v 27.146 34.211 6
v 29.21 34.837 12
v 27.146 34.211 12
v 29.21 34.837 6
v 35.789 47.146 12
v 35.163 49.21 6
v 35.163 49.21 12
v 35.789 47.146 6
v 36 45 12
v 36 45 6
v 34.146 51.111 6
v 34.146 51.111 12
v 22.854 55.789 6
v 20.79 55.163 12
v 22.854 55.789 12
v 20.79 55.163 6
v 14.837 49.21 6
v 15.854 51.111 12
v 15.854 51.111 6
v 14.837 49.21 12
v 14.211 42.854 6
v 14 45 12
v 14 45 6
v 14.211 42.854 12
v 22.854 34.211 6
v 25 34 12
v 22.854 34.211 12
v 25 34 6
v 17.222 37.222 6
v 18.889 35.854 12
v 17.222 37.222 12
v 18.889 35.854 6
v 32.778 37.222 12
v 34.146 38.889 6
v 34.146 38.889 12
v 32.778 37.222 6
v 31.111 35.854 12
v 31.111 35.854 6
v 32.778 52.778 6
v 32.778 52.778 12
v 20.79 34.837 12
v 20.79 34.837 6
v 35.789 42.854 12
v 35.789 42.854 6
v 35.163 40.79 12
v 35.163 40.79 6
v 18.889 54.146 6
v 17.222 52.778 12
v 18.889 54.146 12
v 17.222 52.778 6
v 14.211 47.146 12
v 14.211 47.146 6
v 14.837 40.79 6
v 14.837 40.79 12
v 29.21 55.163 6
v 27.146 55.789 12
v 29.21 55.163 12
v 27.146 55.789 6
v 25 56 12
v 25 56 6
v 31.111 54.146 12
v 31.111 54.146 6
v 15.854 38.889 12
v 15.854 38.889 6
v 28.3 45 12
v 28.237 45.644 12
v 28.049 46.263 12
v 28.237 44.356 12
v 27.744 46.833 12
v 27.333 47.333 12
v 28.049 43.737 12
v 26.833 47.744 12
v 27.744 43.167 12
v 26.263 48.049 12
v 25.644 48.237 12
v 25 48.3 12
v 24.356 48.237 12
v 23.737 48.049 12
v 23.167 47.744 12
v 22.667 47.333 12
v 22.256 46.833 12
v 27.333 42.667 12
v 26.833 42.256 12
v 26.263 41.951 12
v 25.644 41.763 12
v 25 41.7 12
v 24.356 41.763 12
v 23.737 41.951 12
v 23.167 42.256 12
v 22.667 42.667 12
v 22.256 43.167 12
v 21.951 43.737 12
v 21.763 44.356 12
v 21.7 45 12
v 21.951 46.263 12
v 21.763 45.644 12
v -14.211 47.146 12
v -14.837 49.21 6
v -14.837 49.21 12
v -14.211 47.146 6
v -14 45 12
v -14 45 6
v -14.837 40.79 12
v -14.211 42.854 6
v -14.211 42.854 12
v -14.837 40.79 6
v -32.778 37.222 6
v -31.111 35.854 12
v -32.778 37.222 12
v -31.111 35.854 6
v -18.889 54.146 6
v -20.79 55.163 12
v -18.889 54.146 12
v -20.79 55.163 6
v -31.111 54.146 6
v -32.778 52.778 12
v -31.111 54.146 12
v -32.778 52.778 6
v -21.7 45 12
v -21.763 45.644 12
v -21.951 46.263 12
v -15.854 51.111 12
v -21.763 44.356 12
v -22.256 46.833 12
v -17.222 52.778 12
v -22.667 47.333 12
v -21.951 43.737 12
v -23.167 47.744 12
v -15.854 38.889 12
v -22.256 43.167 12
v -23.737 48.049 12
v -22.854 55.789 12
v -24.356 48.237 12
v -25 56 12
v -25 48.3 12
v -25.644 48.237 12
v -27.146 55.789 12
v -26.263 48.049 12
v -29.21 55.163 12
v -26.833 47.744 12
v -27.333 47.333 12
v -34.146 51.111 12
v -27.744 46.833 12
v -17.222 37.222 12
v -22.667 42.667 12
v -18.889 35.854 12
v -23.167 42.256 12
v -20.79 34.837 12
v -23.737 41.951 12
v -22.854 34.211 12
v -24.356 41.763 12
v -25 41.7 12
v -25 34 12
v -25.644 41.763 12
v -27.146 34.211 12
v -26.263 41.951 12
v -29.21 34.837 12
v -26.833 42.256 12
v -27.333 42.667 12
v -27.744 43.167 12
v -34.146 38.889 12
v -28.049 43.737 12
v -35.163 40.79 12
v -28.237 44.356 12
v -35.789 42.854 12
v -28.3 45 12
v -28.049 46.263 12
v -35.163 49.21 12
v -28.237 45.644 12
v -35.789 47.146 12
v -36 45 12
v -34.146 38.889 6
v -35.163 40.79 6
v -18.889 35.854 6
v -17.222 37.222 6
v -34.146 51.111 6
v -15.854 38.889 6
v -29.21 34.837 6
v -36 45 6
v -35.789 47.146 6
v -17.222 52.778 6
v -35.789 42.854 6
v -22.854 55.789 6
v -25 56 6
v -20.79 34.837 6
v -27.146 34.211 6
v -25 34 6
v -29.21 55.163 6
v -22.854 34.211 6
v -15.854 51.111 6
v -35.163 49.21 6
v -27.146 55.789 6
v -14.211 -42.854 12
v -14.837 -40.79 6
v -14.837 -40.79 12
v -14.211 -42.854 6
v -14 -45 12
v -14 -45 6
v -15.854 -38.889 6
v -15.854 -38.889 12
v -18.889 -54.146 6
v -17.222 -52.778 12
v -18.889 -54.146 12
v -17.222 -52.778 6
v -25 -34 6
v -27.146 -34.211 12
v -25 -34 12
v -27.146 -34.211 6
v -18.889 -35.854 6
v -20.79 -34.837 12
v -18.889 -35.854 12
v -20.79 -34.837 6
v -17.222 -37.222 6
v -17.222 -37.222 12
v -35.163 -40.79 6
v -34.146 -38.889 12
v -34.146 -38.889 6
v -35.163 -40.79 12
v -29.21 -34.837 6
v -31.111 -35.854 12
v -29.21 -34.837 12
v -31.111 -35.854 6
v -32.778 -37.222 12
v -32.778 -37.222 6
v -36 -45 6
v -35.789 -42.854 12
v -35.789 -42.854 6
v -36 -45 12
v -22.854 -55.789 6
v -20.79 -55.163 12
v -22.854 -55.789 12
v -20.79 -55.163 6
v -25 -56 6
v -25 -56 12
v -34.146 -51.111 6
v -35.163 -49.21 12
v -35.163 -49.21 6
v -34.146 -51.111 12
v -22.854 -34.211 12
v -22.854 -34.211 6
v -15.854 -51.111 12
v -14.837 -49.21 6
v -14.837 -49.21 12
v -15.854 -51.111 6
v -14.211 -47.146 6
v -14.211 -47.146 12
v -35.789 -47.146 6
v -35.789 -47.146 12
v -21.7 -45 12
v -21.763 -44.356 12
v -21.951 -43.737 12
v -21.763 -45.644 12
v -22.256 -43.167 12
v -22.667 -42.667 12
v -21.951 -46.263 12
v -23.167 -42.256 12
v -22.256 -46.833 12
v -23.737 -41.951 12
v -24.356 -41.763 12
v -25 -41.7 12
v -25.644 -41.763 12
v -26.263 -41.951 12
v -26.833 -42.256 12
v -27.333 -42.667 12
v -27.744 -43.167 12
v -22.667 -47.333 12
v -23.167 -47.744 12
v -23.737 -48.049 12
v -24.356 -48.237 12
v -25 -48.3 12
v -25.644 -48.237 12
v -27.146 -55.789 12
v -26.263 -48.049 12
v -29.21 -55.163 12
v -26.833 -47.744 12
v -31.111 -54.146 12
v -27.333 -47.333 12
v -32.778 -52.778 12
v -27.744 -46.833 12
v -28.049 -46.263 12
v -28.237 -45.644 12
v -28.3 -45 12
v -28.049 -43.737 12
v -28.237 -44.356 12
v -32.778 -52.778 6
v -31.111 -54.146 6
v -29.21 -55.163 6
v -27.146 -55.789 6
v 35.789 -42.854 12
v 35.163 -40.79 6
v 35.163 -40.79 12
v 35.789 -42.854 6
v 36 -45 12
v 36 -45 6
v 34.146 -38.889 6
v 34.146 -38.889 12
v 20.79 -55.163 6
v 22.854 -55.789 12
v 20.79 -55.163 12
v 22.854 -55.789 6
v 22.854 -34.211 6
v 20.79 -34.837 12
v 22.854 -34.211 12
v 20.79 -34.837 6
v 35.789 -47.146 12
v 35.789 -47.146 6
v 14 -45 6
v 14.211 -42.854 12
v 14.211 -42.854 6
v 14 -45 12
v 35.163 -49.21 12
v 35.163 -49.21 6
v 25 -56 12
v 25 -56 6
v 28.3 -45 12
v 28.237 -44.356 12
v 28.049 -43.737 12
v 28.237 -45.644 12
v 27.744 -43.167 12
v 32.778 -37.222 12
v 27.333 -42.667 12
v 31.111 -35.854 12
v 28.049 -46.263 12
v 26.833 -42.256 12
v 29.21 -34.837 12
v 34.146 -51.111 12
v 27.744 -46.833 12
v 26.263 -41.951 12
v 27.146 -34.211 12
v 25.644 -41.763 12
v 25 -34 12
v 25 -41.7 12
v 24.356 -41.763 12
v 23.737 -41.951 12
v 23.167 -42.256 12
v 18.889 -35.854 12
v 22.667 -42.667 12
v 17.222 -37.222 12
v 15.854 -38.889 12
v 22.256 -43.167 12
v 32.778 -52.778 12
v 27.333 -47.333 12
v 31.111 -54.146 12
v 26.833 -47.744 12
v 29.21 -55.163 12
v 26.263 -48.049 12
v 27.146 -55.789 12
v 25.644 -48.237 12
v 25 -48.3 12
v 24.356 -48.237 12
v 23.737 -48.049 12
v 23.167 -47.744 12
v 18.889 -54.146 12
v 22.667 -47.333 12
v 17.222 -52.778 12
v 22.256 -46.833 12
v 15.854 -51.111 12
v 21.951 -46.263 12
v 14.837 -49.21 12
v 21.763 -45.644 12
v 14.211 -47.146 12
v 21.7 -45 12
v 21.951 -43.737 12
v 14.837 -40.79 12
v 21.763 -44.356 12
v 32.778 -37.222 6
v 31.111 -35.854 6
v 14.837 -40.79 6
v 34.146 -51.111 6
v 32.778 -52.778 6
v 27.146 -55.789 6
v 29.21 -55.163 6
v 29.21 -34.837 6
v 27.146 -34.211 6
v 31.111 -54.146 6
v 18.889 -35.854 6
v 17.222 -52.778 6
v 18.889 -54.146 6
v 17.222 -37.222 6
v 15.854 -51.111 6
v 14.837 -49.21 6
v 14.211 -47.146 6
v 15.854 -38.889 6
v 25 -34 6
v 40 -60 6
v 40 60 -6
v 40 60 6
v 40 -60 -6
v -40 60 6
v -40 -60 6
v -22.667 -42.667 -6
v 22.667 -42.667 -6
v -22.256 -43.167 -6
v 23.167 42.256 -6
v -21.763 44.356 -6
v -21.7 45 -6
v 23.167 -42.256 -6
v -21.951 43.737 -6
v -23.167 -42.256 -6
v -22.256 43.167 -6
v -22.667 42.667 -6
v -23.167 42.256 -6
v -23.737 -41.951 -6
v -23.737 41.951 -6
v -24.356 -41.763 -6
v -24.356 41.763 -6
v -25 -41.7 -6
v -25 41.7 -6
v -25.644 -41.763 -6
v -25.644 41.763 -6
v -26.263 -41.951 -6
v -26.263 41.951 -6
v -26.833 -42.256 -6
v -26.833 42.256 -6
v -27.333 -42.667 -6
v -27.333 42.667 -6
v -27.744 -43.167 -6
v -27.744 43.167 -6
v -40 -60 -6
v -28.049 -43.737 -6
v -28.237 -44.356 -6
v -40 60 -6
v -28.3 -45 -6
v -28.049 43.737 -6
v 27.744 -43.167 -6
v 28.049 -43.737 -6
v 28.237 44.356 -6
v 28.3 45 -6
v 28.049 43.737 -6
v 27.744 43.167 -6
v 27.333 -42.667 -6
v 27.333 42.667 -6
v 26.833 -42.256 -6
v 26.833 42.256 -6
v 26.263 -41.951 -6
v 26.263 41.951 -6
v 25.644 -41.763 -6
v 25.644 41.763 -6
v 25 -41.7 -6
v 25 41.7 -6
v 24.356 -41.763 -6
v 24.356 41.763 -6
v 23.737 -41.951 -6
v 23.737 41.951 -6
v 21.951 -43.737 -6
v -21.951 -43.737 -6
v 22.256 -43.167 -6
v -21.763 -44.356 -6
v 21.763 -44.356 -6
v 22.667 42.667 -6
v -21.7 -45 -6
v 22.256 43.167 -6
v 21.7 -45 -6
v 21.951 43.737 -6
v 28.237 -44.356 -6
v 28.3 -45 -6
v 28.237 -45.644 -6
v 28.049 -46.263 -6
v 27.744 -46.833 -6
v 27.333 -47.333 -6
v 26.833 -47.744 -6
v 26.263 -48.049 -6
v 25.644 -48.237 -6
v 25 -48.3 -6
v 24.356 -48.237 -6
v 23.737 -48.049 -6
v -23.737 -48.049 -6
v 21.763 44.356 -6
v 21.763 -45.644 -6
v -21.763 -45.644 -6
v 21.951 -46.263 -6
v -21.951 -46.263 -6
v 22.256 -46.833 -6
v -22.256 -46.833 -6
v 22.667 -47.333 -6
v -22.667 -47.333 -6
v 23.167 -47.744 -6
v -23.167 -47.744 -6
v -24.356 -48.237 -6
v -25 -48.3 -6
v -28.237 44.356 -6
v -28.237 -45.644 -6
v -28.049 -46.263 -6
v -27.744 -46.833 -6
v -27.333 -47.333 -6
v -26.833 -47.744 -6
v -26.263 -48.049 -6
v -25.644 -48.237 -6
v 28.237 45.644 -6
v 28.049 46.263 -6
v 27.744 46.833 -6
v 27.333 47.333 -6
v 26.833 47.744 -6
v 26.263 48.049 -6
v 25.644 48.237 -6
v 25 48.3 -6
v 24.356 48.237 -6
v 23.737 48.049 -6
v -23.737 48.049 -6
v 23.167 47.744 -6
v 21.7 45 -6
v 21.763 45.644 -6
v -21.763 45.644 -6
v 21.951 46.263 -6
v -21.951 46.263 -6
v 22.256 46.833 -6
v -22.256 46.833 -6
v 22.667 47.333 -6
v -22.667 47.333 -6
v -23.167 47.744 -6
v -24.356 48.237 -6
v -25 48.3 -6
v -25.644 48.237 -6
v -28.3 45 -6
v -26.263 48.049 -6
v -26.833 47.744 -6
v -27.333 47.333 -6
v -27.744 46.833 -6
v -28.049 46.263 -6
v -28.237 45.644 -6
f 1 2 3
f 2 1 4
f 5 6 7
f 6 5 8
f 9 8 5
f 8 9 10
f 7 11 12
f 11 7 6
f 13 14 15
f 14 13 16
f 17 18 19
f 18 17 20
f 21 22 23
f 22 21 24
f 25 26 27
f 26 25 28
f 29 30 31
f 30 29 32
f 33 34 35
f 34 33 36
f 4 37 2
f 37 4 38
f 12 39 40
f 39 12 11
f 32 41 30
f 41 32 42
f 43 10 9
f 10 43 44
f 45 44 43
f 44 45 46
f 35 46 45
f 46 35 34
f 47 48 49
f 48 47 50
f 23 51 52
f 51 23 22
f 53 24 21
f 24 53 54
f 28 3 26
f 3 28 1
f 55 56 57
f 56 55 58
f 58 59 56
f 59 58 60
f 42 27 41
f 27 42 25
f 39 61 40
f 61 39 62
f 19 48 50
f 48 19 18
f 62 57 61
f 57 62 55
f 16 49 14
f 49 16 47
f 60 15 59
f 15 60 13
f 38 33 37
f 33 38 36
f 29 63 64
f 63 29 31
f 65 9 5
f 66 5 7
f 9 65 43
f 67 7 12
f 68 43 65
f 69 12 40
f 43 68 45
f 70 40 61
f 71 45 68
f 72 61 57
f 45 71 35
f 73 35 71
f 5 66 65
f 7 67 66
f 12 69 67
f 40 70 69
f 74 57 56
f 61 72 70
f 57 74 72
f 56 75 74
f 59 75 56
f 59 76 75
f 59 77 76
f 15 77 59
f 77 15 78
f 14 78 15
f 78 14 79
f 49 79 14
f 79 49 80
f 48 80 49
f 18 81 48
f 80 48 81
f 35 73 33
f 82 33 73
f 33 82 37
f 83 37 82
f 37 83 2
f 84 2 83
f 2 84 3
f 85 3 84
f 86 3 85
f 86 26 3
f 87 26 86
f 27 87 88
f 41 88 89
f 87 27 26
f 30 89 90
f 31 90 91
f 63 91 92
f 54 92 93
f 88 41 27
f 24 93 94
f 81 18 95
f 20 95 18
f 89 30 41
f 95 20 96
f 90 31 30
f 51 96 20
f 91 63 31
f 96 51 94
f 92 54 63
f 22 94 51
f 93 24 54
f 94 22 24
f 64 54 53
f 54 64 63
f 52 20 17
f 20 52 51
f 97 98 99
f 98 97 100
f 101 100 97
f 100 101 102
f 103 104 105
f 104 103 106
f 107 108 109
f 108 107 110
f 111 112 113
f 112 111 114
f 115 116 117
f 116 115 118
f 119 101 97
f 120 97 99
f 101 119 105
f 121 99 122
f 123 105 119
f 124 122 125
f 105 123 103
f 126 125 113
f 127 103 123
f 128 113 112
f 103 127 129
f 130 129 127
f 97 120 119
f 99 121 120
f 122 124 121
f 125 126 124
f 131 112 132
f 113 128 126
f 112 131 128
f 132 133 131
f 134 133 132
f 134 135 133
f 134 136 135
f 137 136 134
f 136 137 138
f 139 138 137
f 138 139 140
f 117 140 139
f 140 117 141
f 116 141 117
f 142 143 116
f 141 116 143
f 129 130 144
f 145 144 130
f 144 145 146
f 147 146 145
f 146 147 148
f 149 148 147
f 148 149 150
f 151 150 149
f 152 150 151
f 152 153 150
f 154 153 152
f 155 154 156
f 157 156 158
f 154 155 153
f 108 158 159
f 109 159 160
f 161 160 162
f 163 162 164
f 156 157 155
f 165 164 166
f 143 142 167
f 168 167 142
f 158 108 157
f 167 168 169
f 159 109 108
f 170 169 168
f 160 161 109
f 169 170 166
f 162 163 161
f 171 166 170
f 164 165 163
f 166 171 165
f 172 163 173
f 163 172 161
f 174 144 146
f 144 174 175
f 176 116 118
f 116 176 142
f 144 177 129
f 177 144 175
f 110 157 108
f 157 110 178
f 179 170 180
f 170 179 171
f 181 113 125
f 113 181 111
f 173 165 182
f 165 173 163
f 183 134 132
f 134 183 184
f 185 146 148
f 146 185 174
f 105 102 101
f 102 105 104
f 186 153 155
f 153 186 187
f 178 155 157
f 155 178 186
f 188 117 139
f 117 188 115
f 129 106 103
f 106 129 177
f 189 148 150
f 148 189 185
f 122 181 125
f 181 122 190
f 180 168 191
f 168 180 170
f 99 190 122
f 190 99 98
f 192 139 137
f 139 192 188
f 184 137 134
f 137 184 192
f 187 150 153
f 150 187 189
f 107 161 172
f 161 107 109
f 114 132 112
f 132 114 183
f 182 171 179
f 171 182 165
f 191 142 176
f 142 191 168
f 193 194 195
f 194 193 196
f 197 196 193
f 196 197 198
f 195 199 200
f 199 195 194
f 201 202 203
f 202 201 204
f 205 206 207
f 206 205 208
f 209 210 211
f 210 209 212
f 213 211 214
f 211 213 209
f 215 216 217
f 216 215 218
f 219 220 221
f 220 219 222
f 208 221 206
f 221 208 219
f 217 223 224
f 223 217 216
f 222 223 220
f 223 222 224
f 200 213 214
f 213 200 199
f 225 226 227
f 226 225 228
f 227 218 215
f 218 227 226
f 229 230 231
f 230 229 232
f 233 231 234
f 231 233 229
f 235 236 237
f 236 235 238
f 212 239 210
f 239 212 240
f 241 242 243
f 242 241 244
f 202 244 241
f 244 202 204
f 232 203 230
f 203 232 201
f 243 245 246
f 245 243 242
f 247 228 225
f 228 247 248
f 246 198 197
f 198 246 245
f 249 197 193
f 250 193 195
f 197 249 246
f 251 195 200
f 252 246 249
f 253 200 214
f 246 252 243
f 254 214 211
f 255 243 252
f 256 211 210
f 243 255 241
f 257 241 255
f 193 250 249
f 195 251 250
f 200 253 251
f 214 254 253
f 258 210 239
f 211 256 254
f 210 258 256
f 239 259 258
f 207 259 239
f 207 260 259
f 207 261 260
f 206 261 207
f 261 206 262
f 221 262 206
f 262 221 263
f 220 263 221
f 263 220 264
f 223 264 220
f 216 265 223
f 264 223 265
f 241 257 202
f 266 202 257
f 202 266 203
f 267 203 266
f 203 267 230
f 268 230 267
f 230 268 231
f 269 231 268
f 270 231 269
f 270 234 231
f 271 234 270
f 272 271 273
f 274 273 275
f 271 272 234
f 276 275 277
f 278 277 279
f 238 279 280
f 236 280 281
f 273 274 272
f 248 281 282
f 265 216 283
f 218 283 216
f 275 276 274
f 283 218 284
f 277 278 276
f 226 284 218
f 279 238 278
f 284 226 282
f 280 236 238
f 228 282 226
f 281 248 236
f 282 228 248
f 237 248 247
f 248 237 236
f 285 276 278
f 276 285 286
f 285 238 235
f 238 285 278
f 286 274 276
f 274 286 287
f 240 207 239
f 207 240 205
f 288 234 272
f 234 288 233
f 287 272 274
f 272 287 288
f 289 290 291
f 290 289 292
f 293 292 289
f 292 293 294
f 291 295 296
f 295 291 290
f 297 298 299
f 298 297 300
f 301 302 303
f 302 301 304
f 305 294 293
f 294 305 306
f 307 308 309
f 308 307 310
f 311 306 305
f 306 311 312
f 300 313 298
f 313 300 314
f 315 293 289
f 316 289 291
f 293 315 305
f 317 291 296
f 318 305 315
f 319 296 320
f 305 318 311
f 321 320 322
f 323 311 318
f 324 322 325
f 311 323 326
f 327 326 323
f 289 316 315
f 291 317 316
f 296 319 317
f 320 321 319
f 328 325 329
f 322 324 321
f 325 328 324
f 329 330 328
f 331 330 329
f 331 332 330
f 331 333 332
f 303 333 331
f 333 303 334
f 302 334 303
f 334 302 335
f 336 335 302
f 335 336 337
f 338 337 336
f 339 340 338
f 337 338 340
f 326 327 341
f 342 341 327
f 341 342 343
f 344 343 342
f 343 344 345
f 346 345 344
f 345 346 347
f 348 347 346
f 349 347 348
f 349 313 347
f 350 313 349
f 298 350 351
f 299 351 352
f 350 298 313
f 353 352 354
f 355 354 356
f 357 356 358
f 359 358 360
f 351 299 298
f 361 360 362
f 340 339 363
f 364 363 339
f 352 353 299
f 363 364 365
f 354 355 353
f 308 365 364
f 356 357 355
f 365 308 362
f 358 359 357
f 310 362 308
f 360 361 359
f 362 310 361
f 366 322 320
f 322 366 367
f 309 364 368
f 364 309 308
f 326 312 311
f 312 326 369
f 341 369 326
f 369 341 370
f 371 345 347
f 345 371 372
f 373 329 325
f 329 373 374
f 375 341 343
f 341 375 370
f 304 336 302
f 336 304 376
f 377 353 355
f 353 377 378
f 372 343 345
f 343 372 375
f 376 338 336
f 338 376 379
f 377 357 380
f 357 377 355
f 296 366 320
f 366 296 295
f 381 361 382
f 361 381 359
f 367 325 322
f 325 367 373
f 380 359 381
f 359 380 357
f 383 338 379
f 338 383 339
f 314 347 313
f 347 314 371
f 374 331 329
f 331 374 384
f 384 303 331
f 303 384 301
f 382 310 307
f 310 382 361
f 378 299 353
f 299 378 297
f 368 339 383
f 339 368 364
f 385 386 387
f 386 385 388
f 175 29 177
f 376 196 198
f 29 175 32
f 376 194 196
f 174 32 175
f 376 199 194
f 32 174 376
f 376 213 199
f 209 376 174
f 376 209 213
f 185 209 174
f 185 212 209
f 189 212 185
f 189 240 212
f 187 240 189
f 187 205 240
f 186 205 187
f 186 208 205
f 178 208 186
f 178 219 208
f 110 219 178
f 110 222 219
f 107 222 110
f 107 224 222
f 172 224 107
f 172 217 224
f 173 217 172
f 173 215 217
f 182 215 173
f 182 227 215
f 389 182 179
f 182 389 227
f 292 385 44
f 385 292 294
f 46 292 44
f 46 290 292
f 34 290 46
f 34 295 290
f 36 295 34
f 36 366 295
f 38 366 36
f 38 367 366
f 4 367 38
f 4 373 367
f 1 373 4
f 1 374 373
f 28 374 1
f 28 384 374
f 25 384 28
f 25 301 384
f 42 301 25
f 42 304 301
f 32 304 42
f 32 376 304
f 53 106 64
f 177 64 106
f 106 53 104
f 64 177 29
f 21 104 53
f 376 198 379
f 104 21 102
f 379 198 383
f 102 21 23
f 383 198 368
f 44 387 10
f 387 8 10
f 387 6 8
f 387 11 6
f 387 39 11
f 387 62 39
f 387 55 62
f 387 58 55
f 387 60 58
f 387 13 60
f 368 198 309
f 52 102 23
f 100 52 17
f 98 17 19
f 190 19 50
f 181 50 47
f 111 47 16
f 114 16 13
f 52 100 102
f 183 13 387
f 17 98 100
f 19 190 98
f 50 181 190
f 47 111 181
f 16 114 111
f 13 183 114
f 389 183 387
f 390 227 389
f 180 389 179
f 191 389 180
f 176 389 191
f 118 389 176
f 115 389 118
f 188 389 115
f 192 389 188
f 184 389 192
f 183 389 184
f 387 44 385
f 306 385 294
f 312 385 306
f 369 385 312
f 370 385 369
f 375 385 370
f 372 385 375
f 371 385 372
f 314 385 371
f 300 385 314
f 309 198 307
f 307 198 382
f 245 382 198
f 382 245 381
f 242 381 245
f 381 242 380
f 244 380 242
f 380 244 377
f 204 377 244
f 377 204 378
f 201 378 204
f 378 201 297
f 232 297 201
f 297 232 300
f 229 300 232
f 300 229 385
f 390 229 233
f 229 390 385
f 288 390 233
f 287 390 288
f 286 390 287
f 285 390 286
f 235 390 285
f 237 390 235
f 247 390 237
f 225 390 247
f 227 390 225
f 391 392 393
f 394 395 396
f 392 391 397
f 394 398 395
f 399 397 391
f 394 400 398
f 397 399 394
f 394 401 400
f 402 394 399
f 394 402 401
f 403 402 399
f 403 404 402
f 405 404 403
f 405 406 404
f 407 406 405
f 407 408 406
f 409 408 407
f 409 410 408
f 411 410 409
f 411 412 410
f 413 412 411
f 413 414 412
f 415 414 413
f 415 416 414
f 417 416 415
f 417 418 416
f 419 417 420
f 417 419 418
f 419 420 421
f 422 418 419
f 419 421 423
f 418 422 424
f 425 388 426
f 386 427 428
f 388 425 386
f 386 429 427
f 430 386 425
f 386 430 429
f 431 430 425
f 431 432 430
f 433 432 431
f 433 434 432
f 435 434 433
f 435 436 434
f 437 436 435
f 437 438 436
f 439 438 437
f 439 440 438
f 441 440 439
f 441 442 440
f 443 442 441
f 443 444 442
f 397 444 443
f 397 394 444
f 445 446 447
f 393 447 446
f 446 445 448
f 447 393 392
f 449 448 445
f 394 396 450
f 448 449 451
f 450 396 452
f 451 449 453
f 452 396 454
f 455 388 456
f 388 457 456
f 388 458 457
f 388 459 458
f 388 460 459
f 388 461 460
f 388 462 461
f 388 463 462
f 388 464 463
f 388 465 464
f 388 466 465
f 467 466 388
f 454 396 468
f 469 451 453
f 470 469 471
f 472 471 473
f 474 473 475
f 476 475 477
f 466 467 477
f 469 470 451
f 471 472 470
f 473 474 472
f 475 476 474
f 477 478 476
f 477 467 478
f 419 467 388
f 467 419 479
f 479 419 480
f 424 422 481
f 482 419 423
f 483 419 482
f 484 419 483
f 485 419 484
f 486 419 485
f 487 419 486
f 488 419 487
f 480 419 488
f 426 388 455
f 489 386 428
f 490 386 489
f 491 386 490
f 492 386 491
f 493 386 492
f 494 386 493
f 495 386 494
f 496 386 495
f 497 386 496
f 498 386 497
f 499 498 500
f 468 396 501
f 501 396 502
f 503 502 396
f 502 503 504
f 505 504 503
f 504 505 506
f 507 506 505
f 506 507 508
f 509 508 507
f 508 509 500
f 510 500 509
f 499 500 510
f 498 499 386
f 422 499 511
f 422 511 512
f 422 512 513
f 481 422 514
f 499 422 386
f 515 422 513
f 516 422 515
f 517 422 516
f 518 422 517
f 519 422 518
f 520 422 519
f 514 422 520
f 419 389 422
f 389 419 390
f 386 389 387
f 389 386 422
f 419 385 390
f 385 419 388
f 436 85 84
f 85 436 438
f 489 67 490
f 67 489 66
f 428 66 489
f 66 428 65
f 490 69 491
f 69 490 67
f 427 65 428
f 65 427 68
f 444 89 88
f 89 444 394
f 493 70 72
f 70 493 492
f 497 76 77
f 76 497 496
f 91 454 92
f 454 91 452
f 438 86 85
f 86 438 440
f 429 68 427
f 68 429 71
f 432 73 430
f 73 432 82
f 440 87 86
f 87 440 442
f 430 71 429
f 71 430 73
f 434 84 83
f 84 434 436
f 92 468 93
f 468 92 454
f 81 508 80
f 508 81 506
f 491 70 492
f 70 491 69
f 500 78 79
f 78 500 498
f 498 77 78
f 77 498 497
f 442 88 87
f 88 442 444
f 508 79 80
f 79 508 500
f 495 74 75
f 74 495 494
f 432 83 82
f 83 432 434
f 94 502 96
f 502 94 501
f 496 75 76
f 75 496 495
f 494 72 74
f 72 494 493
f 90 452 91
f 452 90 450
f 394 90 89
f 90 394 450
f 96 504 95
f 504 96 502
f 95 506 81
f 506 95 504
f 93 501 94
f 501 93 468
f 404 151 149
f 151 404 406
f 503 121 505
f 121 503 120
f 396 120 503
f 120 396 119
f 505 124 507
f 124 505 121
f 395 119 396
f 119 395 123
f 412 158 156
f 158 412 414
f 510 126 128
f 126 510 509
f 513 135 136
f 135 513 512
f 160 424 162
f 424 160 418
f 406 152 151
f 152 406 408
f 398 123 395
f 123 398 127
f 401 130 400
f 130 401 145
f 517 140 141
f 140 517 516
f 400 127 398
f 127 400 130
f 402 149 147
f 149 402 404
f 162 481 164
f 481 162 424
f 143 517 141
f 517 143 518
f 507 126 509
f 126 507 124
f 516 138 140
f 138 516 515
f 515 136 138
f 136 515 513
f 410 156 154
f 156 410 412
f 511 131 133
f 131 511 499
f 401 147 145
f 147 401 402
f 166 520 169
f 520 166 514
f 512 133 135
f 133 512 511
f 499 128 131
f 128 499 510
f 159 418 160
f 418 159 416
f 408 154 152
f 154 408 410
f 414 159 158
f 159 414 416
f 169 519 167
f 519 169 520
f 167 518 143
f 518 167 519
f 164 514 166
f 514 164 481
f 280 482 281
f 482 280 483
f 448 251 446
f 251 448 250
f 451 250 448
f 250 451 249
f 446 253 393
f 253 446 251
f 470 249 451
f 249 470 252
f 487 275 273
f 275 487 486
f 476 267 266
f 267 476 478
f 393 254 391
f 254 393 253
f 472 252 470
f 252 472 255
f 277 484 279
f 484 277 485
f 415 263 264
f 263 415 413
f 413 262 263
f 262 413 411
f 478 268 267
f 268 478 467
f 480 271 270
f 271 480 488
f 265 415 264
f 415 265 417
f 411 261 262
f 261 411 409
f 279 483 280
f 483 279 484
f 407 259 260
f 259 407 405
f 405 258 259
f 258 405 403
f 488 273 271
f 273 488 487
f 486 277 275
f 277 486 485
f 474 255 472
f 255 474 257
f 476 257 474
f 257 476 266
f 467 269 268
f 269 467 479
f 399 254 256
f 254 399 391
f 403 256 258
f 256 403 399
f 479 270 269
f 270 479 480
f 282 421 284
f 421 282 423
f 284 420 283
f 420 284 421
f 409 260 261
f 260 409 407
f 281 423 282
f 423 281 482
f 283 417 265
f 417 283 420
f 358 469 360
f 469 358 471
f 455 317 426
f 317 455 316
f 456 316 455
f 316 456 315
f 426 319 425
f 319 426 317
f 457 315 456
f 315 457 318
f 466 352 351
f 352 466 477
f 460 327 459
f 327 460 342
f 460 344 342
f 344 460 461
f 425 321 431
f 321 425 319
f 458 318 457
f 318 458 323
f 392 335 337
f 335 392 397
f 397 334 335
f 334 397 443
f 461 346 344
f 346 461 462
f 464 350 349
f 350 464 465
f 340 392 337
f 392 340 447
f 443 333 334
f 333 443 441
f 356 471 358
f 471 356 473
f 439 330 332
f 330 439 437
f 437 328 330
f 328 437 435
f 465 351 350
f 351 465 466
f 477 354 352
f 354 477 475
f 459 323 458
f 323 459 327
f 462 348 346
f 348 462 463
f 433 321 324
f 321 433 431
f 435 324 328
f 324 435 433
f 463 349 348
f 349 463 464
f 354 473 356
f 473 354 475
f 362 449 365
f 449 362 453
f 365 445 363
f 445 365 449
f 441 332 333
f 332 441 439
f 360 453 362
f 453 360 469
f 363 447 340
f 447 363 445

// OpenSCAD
$fn = 32;

// ----------------------------------------------------------------------
// Anchor pads 80 x 120 x 18
// four corner bosses with anchor holes
// ----------------------------------------------------------------------

// --- parameters (mm) ---
plate = [80, 120, 12];  // base plate size (x, y, z)
pads = 4;               // boss count, one per corner
edge = 15;              // boss centre offset from the plate edge
boss_d = 22;            // boss diameter
boss_h = 6;             // boss height above the base plate
hole_d = 6.6;           // hole diameter

// --- derived feature positions (mm) ---
height = plate[2] + boss_h;      // = 18   overall height of the part
corner_x = plate[0] / 2 - edge;  // = 25   boss centre X
corner_y = plate[1] / 2 - edge;  // = 45   boss centre Y
feature_centers = [
  [corner_x, corner_y],
  [-corner_x, corner_y],
  [-corner_x, -corner_y],
  [corner_x, -corner_y]
];   // boss centres, anchor holes are drilled there

// base plate, four bosses standing on it, anchor holes all the way through
difference() {
  union() {
    cube(plate, center = true);
    for (centre = feature_centers)
      translate([centre[0], centre[1], plate[2] / 2 - 1])
        cylinder(d = boss_d, h = boss_h + 1);
  }
  for (centre = feature_centers)
    translate([centre[0], centre[1], -height])
      cylinder(d = hole_d, h = 2 * height + 2);  // through boss and plate
}
